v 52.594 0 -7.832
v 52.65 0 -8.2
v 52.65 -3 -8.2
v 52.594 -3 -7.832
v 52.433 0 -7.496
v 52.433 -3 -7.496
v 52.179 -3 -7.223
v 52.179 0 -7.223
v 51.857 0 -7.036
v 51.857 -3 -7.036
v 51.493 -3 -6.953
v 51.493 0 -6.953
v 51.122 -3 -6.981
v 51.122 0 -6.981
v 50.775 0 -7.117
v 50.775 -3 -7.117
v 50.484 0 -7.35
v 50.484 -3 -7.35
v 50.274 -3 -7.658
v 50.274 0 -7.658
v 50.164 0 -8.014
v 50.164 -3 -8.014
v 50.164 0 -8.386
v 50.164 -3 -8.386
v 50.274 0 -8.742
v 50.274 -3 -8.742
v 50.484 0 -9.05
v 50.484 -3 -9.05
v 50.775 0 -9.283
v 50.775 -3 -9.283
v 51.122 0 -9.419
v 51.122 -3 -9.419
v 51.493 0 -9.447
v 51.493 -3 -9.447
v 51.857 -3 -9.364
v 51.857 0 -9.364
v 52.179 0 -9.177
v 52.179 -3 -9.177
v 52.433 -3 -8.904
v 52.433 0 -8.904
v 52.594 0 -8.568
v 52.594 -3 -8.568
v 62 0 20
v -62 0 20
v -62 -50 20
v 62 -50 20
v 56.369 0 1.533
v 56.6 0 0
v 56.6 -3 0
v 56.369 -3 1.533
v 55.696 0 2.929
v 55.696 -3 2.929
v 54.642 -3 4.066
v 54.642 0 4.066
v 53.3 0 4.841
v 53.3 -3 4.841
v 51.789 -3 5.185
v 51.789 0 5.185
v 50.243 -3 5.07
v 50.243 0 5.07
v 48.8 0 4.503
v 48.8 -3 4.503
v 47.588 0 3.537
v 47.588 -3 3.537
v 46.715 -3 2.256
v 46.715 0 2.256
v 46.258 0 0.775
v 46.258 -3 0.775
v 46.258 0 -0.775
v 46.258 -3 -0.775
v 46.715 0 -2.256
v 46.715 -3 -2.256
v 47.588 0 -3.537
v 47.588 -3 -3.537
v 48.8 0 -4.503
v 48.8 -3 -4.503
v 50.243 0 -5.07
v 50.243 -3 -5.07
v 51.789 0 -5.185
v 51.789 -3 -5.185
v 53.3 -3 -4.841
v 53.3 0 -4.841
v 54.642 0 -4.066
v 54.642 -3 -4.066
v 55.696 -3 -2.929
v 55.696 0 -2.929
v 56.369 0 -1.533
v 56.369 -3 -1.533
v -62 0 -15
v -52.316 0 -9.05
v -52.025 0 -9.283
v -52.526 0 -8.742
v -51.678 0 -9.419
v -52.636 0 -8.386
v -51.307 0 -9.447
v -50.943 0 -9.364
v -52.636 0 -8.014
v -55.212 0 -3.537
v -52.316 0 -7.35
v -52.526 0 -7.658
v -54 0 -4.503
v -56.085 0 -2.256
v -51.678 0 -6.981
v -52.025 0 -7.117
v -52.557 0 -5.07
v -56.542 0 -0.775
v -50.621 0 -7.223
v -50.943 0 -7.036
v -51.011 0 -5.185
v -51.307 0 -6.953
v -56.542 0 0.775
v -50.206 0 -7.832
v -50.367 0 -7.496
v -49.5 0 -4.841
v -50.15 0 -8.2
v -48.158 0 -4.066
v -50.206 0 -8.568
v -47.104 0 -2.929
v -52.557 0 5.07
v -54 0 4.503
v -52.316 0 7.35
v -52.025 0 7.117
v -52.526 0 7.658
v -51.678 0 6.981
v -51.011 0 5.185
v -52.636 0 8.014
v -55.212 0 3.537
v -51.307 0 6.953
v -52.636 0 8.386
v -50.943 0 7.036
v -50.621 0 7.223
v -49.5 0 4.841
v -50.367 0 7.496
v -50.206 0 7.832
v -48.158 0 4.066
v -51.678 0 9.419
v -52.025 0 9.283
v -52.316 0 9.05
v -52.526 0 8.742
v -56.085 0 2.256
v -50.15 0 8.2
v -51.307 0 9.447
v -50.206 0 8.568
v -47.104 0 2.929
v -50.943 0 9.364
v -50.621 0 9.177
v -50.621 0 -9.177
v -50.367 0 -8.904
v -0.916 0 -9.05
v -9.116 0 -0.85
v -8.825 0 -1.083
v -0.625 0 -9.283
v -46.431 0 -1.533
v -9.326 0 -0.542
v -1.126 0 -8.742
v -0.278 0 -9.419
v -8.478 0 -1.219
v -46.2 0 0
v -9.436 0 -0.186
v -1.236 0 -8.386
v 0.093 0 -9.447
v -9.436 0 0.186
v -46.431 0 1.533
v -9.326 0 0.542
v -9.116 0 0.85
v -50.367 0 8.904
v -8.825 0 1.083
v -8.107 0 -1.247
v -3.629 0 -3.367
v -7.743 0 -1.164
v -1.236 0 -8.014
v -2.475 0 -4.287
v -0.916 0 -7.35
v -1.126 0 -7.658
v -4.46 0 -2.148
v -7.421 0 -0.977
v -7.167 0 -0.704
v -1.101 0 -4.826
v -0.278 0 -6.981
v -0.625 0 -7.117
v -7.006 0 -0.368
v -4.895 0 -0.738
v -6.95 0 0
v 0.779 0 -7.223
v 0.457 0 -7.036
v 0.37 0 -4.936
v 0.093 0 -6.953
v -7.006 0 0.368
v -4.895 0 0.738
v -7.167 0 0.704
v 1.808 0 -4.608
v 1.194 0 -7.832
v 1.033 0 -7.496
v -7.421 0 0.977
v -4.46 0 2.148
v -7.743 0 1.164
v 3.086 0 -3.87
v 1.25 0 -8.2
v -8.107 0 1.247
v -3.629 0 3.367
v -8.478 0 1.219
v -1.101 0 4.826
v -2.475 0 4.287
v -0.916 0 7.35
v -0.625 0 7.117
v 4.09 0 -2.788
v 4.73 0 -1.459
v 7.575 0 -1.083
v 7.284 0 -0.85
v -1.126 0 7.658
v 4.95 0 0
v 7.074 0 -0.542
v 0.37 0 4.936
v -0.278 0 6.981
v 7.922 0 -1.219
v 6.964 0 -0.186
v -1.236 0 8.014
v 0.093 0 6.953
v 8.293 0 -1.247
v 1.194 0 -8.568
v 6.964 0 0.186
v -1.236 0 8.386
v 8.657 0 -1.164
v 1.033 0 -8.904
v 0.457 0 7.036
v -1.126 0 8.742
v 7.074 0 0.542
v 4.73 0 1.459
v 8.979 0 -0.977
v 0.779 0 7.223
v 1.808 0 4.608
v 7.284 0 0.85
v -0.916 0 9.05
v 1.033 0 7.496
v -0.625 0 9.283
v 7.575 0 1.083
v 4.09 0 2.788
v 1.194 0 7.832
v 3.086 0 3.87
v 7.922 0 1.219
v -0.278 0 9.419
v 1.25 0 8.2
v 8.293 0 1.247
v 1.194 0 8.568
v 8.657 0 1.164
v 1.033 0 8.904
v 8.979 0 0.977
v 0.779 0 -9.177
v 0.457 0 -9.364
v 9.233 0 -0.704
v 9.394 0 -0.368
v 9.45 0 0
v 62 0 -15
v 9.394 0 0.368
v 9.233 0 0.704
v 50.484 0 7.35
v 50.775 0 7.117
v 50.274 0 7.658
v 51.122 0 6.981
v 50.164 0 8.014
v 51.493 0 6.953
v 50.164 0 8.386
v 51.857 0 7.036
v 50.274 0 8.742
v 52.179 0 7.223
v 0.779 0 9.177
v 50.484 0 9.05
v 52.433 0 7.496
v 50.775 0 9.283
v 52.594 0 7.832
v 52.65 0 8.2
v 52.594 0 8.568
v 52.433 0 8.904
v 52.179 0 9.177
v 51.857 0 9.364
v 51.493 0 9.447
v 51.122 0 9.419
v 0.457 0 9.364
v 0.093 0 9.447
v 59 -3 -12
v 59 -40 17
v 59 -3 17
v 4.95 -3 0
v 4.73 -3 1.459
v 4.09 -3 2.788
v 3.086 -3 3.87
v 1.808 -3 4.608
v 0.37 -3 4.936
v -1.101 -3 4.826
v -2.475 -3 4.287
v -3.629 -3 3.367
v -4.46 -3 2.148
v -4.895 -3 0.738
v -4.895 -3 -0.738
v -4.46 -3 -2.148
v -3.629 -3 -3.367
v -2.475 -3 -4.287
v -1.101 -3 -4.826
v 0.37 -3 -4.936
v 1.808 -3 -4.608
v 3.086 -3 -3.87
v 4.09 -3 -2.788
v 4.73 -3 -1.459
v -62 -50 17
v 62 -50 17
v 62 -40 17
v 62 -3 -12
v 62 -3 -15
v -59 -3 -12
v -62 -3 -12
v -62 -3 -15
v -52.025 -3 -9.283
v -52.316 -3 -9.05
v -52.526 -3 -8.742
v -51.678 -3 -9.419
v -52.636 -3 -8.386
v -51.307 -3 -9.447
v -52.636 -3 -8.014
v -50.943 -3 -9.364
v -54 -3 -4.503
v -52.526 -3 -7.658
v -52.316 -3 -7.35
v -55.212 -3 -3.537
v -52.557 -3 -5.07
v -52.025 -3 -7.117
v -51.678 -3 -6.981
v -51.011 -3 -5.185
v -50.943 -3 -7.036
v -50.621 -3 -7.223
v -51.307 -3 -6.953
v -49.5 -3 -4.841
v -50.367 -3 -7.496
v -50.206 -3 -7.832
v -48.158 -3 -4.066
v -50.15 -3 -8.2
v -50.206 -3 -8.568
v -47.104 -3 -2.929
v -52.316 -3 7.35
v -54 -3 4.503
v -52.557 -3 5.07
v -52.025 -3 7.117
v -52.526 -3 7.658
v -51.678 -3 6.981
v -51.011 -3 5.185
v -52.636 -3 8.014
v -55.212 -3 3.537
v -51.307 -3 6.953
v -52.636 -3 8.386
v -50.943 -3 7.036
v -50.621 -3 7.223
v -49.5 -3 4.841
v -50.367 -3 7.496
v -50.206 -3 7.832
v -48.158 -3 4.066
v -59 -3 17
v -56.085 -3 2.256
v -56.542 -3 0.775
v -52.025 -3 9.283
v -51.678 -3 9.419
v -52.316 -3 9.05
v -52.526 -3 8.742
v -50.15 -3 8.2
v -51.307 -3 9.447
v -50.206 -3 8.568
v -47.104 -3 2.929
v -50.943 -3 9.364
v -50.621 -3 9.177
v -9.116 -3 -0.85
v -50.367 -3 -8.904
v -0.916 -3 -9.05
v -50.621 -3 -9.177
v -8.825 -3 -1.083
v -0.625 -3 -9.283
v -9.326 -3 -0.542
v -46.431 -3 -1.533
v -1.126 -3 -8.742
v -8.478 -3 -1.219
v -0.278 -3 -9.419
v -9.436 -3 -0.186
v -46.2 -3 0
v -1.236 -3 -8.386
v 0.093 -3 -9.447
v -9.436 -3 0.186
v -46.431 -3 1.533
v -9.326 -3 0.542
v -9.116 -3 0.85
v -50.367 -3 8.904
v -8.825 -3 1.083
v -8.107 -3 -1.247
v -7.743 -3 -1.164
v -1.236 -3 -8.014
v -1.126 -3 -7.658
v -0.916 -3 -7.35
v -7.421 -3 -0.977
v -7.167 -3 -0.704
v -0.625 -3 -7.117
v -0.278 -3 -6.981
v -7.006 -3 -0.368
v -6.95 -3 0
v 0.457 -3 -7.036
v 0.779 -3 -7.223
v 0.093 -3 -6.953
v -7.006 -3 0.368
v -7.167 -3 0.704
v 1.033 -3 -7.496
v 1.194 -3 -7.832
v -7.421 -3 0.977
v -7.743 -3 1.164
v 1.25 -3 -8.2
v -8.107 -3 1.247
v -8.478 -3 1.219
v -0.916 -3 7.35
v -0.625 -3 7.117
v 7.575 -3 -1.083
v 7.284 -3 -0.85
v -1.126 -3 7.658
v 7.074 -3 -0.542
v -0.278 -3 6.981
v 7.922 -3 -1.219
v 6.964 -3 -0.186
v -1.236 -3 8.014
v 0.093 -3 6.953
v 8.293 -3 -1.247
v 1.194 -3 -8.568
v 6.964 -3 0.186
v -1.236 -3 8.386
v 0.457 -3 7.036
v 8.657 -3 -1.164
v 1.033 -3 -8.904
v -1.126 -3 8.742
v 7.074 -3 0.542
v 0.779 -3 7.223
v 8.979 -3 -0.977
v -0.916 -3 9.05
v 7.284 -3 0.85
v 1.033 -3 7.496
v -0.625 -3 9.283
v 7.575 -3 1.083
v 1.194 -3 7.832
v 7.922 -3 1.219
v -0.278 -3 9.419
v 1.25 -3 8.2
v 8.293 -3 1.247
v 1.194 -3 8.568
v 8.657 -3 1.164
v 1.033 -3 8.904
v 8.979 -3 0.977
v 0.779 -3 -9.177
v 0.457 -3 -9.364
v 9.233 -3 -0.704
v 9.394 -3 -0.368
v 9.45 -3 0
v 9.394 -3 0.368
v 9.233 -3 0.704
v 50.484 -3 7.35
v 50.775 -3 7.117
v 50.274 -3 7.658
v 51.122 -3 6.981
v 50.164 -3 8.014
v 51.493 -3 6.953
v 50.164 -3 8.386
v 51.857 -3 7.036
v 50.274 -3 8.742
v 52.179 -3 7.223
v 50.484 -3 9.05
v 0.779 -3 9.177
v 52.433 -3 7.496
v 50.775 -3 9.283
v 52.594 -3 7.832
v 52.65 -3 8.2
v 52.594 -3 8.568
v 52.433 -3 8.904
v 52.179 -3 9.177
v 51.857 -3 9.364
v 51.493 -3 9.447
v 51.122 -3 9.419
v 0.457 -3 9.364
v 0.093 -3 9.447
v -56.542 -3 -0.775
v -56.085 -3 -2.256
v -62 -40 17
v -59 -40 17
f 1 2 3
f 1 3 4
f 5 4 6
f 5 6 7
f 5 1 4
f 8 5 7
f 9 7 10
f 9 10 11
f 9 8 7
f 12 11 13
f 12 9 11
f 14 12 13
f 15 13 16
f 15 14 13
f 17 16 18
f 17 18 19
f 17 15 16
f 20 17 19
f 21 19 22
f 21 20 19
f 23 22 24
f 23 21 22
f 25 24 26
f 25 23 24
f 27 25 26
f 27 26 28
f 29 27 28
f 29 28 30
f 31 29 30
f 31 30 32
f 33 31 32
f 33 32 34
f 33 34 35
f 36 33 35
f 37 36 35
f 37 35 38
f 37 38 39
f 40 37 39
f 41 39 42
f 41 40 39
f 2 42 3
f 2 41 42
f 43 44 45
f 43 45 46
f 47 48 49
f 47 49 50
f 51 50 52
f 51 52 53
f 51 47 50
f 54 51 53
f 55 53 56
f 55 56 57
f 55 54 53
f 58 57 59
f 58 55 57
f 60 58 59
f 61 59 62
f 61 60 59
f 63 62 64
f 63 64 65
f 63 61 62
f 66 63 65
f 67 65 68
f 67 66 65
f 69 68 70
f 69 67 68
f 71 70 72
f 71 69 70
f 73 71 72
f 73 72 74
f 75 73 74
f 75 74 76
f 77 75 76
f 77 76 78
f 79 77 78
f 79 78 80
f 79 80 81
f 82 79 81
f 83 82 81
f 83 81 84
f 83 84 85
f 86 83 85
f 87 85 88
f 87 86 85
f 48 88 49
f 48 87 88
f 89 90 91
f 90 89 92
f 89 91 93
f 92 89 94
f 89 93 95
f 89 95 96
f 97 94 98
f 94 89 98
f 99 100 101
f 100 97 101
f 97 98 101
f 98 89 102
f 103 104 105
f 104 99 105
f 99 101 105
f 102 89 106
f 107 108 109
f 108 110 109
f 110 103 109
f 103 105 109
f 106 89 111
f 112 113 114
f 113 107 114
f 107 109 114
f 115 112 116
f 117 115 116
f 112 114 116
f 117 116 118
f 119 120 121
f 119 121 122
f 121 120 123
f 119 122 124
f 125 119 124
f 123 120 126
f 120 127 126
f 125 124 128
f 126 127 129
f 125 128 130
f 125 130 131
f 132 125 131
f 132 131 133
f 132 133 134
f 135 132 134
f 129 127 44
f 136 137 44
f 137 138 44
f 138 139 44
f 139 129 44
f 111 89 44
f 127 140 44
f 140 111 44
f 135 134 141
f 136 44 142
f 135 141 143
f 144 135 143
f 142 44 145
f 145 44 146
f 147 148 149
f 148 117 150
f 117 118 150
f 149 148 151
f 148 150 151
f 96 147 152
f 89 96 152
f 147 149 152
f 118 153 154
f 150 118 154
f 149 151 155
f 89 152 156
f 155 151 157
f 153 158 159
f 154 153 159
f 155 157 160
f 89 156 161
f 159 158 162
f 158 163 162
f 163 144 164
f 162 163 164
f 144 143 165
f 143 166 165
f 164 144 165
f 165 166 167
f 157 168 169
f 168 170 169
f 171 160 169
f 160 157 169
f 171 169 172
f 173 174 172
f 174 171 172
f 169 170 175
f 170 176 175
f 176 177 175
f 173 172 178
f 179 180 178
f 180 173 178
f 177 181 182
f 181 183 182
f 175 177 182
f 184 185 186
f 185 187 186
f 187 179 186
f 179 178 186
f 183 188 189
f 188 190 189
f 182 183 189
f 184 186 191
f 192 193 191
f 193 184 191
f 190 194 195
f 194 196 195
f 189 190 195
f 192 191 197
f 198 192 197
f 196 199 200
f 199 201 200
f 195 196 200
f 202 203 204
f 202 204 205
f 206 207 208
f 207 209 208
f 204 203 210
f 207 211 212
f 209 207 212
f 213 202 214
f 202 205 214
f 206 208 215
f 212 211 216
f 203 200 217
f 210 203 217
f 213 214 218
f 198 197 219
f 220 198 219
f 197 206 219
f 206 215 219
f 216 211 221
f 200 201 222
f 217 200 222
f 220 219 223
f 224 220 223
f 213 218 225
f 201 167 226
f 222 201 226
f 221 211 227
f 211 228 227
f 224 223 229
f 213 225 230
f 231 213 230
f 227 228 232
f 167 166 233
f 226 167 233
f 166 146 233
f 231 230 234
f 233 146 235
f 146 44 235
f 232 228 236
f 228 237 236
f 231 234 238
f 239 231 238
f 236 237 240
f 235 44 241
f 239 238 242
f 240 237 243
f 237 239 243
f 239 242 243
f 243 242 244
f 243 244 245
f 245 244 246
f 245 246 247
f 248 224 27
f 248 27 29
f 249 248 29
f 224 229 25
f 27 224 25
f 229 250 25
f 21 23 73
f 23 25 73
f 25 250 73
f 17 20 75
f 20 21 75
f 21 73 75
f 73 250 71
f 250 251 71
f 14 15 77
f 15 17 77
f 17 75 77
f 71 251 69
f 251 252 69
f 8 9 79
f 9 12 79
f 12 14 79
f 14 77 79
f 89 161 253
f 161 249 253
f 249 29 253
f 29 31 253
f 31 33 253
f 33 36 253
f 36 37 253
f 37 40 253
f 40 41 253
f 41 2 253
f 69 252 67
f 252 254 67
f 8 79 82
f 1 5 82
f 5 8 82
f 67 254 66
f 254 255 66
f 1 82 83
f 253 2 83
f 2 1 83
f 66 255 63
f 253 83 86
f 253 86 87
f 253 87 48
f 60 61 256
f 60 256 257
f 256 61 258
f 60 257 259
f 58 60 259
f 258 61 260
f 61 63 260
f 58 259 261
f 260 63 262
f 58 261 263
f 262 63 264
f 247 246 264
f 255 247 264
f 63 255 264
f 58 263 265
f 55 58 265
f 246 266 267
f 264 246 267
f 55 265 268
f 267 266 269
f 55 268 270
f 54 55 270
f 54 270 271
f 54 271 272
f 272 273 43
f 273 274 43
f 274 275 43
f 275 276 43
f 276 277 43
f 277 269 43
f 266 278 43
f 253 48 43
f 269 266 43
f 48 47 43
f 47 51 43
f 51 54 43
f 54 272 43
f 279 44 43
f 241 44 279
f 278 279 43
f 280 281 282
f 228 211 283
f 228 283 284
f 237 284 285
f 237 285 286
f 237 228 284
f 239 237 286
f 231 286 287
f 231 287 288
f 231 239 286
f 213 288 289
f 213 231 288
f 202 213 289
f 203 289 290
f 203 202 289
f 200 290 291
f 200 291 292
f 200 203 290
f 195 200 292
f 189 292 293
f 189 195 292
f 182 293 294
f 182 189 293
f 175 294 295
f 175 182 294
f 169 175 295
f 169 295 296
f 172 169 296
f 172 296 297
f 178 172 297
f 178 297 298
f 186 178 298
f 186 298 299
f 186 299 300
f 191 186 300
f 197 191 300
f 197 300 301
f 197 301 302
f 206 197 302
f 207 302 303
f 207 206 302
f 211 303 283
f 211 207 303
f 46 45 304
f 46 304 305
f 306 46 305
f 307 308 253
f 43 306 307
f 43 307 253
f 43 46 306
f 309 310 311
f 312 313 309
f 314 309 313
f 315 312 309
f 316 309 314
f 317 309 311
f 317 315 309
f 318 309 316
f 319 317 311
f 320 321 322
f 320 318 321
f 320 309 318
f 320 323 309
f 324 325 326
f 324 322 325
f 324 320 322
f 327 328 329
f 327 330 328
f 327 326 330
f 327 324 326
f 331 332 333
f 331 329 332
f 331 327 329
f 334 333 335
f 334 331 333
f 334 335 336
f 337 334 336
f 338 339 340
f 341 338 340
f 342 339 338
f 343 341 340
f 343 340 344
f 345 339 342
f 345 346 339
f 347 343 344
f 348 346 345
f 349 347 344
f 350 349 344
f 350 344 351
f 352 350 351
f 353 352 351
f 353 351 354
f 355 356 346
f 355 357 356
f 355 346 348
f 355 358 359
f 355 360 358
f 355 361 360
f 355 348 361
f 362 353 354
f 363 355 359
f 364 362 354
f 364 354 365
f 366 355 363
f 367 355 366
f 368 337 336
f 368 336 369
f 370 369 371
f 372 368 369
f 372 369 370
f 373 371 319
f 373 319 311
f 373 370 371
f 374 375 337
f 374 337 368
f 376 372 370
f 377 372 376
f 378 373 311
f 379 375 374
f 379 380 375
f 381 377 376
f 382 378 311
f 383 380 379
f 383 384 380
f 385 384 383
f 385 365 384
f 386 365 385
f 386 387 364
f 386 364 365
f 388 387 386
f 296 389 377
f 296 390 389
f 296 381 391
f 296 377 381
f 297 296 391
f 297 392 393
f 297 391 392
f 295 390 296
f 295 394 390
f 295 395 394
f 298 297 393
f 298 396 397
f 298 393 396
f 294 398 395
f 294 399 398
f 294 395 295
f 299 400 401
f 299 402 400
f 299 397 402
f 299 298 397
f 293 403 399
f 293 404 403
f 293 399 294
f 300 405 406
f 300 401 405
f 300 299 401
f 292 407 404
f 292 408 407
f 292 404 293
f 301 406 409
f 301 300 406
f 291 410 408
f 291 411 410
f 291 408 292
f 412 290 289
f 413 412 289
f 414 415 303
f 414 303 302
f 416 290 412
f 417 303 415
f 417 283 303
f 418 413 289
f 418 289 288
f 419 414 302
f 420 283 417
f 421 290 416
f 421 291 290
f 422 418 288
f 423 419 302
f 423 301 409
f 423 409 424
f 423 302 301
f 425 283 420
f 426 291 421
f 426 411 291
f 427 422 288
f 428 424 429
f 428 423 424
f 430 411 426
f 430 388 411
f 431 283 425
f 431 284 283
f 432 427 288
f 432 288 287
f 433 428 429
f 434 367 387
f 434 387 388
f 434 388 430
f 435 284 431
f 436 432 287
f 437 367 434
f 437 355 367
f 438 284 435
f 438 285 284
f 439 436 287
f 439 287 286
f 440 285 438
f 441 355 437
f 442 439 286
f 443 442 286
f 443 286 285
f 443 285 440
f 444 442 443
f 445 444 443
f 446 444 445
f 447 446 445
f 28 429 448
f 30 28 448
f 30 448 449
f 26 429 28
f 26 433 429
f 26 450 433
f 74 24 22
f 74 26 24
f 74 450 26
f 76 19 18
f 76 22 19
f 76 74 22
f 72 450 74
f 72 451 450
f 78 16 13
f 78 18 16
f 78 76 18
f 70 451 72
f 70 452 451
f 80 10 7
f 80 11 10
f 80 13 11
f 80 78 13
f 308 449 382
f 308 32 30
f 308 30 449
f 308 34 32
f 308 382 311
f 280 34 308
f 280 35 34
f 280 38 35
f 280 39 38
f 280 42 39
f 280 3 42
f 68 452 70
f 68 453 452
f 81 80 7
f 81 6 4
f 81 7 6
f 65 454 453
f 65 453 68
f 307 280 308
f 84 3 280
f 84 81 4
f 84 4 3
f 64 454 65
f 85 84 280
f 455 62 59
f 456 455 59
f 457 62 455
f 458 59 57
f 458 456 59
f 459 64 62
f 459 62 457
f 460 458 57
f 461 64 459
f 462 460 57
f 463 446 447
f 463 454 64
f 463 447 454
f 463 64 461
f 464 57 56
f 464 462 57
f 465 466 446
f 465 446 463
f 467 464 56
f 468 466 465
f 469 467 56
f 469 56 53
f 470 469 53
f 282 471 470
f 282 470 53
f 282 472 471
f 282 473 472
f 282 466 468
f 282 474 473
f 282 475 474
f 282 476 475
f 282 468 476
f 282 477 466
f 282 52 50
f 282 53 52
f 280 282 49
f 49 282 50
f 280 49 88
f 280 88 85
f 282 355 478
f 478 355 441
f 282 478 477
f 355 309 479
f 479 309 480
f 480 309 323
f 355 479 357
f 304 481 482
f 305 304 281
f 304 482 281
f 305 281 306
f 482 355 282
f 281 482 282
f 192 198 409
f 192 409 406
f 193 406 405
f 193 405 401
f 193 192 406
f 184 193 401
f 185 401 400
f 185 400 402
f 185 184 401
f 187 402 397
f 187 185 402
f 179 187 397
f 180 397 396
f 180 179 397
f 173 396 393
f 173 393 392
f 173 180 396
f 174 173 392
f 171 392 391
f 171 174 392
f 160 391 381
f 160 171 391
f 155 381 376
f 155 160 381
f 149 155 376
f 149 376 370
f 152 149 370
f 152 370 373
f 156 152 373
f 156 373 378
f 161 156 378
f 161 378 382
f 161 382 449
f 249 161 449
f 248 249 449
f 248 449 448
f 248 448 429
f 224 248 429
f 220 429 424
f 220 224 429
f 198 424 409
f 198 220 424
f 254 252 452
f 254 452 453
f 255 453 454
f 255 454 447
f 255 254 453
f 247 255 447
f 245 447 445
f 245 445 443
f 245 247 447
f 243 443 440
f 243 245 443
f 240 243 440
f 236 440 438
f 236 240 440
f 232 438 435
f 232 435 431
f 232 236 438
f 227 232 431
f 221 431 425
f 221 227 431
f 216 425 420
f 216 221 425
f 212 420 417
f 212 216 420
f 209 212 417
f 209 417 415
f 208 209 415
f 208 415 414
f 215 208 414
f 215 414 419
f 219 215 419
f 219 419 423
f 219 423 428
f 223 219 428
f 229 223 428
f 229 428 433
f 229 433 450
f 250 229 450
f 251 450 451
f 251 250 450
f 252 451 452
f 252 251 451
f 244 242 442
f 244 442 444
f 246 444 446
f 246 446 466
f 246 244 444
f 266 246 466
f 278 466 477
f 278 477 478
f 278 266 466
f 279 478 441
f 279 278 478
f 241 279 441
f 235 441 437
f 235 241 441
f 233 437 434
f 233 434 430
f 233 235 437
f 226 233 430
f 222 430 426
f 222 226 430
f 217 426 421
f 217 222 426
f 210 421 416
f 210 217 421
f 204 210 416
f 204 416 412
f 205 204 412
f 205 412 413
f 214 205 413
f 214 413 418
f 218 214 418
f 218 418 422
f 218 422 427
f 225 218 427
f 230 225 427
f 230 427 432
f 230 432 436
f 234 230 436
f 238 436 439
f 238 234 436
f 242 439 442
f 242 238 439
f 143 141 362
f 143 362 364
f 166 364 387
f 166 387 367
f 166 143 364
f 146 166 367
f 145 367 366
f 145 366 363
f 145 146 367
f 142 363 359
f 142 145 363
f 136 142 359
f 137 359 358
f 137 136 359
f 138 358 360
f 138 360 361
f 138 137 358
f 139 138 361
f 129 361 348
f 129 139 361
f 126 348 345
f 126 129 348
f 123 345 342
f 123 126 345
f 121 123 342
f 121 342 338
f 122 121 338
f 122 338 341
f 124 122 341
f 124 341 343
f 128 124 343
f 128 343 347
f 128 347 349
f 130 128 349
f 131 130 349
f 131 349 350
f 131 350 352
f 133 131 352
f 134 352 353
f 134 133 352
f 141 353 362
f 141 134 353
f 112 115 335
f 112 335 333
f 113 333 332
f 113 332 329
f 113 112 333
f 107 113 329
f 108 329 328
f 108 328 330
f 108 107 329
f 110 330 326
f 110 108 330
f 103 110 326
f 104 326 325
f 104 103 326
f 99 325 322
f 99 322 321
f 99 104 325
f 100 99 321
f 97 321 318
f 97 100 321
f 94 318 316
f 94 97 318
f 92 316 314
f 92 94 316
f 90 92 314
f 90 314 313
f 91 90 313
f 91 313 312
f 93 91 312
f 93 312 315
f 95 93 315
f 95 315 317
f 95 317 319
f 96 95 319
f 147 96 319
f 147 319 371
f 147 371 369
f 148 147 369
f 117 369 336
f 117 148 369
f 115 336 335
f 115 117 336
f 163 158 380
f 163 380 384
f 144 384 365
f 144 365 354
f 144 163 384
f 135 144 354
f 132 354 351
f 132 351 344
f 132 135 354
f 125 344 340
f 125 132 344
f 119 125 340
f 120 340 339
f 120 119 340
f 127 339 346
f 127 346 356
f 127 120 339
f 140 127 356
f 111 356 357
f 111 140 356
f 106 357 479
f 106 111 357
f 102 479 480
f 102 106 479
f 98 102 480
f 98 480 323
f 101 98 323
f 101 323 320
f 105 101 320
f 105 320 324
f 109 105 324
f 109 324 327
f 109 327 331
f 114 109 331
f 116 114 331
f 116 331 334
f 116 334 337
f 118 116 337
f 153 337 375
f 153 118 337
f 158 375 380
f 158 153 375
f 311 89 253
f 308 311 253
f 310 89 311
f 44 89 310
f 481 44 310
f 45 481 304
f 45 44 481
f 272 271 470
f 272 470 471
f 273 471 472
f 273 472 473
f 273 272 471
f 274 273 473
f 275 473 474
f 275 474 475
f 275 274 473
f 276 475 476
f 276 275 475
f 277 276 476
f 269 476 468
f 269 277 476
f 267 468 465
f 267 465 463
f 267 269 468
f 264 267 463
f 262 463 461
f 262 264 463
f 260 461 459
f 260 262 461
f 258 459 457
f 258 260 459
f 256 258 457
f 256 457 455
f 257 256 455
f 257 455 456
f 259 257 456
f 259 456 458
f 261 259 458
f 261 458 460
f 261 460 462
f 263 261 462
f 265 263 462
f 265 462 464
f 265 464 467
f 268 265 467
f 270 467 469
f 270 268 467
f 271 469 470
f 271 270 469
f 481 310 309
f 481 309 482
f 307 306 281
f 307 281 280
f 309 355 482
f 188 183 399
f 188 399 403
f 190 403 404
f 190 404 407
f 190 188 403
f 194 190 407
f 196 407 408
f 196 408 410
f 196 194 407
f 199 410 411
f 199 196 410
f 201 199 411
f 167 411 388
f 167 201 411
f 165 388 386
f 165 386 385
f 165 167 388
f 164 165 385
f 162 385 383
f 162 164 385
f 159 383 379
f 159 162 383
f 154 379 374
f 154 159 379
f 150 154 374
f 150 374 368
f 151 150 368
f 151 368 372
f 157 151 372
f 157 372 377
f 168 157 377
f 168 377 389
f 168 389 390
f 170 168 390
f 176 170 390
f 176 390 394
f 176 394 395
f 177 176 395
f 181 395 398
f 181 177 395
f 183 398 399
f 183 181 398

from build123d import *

# Parameters (mm, degrees)
F0_W     = 124
F0_H     = 32
F0_R     = 1.25
F0_R_2   = 5.2
F0_R_3   = 4.95
F1_DEPTH = 3
F0_H_2   = 3
F2_DEPTH = 50
F5_DEPTH = 3
F6_DEPTH = 3


with BuildPart() as f1:
    # F0 (on Front) → F1 (new body)
    with BuildSketch(Plane.XZ):
        with Locations((0, 1)):
            Rectangle(F0_W, F0_H)
        with Locations((-51.4, -8.2)):
            Circle(F0_R, mode=Mode.SUBTRACT)
        with Locations((-51.4, 0)):
            Circle(F0_R_2, mode=Mode.SUBTRACT)
        with Locations((-8.2, 0)):
            Circle(F0_R, mode=Mode.SUBTRACT)
        with Locations((0, -8.2)):
            Circle(F0_R, mode=Mode.SUBTRACT)
        with Locations((51.4, -8.2)):
            Circle(F0_R, mode=Mode.SUBTRACT)
        Circle(F0_R_3, mode=Mode.SUBTRACT)
        with Locations((8.2, 0)):
            Circle(F0_R, mode=Mode.SUBTRACT)
        with Locations((51.4, 0)):
            Circle(F0_R_2, mode=Mode.SUBTRACT)
        with Locations((-51.4, 8.2)):
            Circle(F0_R, mode=Mode.SUBTRACT)
        with Locations((0, 8.2)):
            Circle(F0_R, mode=Mode.SUBTRACT)
        with Locations((51.4, 8.2)):
            Circle(F0_R, mode=Mode.SUBTRACT)
    extrude(amount=F1_DEPTH)

    # F0 (on Front) → F2 (join)
    with BuildSketch(Plane.XZ):
        with Locations((0, 18.5)):
            Rectangle(F0_W, F0_H_2)
    extrude(amount=F2_DEPTH)

    # F4 (on face) → F5 (join)
    with BuildSketch(Plane(origin=(-62, 0, 0), x_dir=(0, -1, 0), z_dir=(-1, 0, 0))):
        Polygon((3, 17), (3, -12), (40, 17), align=None)
    extrude(amount=-F5_DEPTH)

    # F3 (on face) → F6 (join)
    with BuildSketch(Plane.YZ.offset(62)):
        Polygon((-3, 17), (-40, 17), (-3, -12), align=None)
    extrude(amount=-F6_DEPTH)


solid = f1.part
